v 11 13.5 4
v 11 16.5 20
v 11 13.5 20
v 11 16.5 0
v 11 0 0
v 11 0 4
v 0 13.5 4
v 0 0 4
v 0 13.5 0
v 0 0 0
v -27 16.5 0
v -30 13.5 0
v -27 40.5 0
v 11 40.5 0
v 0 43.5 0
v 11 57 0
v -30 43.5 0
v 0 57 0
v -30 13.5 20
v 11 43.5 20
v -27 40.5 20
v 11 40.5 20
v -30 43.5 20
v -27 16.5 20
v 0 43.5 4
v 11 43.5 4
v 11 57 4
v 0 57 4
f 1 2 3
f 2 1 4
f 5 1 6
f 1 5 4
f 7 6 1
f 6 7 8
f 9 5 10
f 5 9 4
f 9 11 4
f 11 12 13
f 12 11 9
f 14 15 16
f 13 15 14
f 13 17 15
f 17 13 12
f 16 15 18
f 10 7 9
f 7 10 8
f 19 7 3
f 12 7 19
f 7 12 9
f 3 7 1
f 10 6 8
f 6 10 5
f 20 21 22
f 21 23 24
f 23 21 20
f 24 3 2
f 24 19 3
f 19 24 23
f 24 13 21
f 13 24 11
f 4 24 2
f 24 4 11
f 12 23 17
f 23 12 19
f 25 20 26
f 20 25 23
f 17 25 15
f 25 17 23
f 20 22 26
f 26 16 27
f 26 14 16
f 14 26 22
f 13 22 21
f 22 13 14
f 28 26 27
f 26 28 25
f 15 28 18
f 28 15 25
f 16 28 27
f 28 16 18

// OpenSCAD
//BattRack

//variables
xLeg = 11;
yLeg = 13.5;
zLeg = 4;

xSide = 38;
ySide = 3;
zSide = 20;

xBack = 3;
yBack = 30;
zBack = 20;


//module
module Leg(){
    cube([xLeg, yLeg,     zLeg]);    
}

module Side(){
    cube([xSide, ySide,     zSide]);
}


module Back(){
     cube([xBack, yBack,     zBack]);
}

module battRack(){
    union(){
        Leg();
        translate([-xSide+xLeg,yLeg,0])
            Side();  
        translate([-xSide+xLeg-xBack,yLeg,0])
            Back();
        translate([-xSide+xLeg,yLeg+yBack-ySide,0])
            Side();
        translate([0,yLeg+yBack,0])
            Leg();
    }  
}

battRack();
